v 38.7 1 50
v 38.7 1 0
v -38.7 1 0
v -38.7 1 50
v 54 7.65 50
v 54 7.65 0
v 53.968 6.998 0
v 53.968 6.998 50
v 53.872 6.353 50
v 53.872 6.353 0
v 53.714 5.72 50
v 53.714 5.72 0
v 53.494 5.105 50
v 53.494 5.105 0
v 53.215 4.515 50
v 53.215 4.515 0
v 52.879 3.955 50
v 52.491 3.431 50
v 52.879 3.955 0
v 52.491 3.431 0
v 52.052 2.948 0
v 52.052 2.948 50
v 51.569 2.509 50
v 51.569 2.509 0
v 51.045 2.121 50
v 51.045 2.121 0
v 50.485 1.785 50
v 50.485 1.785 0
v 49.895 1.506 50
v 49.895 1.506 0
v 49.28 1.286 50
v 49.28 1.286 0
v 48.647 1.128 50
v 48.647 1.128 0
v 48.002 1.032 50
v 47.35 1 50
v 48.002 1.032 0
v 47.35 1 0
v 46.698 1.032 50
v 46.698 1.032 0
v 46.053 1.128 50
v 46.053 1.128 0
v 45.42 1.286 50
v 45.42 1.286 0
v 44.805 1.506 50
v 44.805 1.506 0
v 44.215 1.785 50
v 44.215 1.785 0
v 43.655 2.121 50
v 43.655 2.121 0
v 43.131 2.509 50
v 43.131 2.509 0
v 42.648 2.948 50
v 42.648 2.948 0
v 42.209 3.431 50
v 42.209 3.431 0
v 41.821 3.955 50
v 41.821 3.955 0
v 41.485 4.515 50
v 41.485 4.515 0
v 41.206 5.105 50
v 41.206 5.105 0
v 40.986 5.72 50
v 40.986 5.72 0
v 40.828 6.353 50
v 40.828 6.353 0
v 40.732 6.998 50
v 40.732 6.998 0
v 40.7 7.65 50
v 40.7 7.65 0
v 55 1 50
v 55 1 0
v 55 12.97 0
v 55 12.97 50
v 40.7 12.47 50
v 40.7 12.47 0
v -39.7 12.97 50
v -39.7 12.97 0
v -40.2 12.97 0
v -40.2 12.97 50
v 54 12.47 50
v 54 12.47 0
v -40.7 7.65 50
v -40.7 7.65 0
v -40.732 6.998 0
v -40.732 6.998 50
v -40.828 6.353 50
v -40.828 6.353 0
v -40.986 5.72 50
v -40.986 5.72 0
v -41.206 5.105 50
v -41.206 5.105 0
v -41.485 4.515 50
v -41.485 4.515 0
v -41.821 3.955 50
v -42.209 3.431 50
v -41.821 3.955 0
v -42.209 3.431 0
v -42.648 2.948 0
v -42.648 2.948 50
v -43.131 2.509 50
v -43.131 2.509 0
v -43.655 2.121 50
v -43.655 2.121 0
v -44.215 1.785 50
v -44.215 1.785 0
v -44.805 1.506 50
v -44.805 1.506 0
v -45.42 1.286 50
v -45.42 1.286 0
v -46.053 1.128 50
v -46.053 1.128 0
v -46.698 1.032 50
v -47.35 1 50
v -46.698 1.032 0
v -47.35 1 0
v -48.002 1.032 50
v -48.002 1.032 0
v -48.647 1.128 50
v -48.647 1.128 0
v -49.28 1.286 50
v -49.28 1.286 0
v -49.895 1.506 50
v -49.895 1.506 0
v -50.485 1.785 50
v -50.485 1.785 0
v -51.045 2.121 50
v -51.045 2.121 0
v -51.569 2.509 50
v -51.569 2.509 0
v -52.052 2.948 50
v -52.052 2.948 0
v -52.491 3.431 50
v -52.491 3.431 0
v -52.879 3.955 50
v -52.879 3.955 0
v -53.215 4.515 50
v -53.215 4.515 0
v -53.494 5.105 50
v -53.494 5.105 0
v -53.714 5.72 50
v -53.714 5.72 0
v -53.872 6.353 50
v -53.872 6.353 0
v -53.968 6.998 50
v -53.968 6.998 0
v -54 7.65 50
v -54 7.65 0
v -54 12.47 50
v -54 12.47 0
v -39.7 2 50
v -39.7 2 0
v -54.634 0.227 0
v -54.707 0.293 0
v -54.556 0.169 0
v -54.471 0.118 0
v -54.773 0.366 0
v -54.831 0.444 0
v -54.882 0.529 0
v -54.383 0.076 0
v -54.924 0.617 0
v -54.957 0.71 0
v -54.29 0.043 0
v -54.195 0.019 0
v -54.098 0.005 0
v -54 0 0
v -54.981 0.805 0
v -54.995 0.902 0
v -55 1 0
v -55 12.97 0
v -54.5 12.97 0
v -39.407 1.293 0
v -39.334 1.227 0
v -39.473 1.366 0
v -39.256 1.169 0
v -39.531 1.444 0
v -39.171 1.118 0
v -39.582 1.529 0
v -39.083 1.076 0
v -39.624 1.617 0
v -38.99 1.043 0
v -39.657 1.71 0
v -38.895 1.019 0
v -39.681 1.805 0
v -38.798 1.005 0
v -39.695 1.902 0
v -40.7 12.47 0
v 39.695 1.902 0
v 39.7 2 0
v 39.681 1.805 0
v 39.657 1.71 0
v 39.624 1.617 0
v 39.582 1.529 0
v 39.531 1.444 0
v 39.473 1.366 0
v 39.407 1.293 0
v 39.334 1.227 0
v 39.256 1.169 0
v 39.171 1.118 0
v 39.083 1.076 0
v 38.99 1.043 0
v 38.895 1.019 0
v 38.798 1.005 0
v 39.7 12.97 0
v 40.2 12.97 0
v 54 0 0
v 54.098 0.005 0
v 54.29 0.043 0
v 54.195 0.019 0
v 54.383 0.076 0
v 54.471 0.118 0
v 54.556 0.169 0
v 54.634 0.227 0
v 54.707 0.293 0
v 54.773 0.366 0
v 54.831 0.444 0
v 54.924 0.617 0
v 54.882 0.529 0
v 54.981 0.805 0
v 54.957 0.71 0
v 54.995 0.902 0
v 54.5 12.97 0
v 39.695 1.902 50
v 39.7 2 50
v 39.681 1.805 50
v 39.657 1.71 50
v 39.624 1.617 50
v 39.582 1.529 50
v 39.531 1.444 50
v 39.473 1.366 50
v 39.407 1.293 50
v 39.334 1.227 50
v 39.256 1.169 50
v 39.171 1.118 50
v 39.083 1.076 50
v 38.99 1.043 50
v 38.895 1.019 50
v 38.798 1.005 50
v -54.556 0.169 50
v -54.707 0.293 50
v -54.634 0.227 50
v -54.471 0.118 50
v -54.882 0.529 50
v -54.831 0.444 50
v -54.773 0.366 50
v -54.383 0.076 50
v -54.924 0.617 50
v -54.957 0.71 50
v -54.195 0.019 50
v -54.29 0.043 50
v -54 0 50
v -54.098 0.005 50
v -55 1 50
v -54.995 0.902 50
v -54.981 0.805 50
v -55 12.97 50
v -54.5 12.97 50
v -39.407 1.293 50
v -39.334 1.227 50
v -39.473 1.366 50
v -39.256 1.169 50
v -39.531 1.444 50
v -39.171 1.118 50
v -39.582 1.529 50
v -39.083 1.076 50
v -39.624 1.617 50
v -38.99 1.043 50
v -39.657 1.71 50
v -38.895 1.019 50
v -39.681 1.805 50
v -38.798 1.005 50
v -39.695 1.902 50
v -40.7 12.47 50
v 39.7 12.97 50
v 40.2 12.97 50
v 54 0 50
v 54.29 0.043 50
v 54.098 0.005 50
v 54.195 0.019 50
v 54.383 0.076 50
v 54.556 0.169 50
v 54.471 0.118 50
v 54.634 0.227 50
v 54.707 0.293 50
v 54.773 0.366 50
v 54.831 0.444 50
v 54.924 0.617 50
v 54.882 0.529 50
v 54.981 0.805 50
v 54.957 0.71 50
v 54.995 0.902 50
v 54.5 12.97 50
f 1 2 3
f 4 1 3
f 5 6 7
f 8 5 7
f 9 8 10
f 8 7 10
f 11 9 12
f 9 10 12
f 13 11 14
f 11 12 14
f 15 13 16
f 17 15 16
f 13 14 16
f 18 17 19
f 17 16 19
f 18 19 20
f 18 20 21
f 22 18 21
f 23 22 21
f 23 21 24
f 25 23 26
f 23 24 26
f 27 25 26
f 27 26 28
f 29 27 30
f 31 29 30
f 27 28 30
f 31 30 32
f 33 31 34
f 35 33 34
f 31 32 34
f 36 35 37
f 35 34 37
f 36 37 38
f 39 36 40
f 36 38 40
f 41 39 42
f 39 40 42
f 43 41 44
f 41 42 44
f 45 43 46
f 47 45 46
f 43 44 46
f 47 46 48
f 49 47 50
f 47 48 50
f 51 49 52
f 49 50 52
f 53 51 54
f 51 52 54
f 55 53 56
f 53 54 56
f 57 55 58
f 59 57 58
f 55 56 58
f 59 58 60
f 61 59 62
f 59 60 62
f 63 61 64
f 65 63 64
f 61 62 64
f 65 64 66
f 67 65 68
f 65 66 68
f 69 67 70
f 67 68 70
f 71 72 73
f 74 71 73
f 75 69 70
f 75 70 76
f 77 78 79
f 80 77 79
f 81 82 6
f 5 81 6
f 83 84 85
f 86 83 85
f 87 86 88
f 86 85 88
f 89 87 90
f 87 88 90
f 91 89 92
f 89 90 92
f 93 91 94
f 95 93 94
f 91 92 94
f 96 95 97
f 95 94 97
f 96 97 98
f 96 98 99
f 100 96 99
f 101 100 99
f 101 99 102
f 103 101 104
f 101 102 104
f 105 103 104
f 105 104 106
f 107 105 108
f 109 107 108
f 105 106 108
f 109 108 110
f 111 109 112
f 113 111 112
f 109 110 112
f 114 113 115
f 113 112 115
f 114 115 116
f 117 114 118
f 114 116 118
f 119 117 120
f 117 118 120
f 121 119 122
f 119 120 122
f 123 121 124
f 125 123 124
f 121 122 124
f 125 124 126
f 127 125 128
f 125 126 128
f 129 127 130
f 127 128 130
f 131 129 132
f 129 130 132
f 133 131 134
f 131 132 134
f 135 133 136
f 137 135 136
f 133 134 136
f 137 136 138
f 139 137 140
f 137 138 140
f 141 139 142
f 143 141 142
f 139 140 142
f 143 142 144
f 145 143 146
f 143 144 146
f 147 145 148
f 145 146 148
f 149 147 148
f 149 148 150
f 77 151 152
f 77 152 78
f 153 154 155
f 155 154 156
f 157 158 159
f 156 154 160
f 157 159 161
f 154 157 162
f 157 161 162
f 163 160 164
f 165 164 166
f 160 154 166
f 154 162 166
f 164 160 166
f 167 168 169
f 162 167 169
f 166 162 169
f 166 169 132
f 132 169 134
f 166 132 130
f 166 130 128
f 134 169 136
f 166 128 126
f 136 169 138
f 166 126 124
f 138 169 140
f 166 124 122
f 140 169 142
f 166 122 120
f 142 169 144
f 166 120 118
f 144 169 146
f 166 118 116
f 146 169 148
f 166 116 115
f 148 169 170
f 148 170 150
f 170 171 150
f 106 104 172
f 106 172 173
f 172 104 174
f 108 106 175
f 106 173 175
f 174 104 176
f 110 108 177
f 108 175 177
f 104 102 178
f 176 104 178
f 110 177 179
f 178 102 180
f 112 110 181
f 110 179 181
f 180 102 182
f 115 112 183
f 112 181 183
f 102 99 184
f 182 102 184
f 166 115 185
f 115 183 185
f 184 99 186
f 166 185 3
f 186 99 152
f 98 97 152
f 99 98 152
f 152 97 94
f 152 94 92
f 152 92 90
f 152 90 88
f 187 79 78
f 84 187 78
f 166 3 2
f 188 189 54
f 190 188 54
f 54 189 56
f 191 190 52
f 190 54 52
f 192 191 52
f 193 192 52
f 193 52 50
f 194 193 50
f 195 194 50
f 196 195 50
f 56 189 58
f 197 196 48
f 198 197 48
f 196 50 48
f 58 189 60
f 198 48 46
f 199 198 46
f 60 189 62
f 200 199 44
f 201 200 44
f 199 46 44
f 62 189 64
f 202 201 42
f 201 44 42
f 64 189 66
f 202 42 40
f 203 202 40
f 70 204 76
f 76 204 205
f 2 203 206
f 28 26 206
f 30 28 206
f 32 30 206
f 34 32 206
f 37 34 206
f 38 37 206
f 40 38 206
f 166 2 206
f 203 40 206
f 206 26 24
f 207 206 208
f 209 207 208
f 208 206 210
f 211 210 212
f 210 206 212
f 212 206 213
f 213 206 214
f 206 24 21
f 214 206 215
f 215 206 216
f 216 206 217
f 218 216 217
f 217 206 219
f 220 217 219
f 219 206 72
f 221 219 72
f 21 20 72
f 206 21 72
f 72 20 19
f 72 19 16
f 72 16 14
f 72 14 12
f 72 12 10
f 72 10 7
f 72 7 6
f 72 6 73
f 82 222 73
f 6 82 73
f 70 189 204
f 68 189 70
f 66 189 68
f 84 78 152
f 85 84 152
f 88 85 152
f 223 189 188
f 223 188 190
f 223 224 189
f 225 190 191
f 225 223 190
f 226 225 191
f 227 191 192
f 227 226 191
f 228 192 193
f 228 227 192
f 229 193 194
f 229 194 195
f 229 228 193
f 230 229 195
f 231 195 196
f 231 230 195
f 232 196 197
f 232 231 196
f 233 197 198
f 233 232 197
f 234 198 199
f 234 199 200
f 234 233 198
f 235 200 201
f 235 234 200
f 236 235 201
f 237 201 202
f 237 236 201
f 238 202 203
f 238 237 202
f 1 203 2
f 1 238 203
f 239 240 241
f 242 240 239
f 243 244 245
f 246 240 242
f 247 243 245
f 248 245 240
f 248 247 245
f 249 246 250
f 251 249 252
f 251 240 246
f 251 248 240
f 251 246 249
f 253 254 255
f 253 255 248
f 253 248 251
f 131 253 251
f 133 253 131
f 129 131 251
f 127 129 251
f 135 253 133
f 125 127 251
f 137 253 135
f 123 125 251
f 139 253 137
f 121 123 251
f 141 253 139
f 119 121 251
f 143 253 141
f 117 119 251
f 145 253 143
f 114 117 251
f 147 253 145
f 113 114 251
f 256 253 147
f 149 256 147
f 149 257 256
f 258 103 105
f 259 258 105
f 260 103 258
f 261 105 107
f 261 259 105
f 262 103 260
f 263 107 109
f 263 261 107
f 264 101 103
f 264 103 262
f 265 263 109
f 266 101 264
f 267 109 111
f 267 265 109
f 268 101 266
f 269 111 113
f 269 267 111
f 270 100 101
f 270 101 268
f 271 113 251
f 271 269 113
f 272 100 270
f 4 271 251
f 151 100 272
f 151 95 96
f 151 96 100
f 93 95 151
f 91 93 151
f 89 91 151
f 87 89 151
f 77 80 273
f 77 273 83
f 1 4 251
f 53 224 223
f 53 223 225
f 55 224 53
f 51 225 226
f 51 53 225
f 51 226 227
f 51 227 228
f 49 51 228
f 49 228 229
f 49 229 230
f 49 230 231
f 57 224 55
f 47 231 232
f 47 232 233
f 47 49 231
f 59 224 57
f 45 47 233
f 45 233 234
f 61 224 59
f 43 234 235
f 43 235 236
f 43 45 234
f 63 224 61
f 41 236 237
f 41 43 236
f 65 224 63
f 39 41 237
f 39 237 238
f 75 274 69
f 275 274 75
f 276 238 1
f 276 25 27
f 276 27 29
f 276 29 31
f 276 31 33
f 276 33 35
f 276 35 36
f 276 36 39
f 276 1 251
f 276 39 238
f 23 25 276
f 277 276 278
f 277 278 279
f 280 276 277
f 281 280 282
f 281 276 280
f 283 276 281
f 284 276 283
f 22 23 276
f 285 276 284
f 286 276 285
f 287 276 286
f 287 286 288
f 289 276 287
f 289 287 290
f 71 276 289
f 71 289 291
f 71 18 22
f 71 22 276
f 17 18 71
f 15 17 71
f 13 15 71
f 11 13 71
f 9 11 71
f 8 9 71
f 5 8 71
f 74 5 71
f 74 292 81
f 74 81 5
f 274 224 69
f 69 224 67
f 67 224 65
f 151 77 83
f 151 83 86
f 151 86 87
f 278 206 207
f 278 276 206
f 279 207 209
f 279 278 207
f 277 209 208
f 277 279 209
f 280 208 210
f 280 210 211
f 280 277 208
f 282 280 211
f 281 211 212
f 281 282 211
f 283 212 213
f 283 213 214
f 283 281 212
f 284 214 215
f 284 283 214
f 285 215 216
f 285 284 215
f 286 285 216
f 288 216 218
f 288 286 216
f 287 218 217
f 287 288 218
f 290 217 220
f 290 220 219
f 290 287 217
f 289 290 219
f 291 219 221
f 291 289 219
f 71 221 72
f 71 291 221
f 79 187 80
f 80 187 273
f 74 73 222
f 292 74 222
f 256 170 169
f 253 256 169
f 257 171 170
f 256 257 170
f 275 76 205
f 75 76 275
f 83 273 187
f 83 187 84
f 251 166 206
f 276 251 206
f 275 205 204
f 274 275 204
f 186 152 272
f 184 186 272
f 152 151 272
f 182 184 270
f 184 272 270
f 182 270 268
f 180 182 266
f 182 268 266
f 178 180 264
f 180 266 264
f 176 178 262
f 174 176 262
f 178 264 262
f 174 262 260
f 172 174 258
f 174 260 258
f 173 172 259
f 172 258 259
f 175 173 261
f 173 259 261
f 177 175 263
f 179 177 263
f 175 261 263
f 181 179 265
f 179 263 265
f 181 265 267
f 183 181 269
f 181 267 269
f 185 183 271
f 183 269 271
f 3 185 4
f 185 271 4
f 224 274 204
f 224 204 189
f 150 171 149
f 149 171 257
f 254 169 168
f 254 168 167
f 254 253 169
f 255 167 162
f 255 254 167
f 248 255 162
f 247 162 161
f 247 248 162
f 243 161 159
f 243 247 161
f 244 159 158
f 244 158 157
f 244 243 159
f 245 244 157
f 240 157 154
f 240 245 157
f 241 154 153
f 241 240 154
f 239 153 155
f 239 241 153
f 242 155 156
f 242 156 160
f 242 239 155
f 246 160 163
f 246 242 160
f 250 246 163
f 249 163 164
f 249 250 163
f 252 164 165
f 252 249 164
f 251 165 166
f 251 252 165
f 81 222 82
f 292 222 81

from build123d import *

# Parameters (mm, degrees)
F2_DEPTH = 50
F3_R     = 1
F4_SIZE  = 0.5


with BuildPart() as f2:
    # F1 (on Top) → F2 (new body)
    with BuildSketch(Plane.XY):
        with BuildLine():
            Line((0, 1), (-39.7, 1))
            Line((-39.7, 1), (-39.7, 12.97))
            Line((-39.7, 12.97), (-40.7, 12.97))
            Line((-40.7, 12.97), (-40.7, 7.65))
            ThreePointArc((-40.7, 7.65), (-47.35, 1), (-54, 7.65))
            Line((-54, 7.65), (-54, 12.97))
            Line((-54, 12.97), (-55, 12.97))
            Line((-55, 12.97), (-55, 0))
            Line((-55, 0), (0, 0))
            Line((0, 0), (55, 0))
            Line((55, 0), (55, 12.97))
            Line((55, 12.97), (54, 12.97))
            Line((54, 12.97), (54, 7.65))
            ThreePointArc((54, 7.65), (47.35, 1), (40.7, 7.65))
            Line((40.7, 7.65), (40.7, 12.97))
            Line((40.7, 12.97), (39.7, 12.97))
            Line((39.7, 12.97), (39.7, 1))
            Line((39.7, 1), (0, 1))
        make_face()
    extrude(amount=F2_DEPTH)

    # F3
    f3_edges = [f2.edges().sort_by_distance(p)[0] for p in [
        (-55, 0, 25),
        (55, 0, 25),
        (39.7, 1, 25),
        (-39.7, 1, 25),
    ]]
    fillet(f3_edges, radius=F3_R)

    # F4
    f4_edges = [f2.edges().sort_by_distance(p)[0] for p in [
        (-54, 12.97, 25),
        (-40.7, 12.97, 25),
        (40.7, 12.97, 25),
        (54, 12.97, 25),
    ]]
    chamfer(f4_edges, length=F4_SIZE)


solid = f2.part
